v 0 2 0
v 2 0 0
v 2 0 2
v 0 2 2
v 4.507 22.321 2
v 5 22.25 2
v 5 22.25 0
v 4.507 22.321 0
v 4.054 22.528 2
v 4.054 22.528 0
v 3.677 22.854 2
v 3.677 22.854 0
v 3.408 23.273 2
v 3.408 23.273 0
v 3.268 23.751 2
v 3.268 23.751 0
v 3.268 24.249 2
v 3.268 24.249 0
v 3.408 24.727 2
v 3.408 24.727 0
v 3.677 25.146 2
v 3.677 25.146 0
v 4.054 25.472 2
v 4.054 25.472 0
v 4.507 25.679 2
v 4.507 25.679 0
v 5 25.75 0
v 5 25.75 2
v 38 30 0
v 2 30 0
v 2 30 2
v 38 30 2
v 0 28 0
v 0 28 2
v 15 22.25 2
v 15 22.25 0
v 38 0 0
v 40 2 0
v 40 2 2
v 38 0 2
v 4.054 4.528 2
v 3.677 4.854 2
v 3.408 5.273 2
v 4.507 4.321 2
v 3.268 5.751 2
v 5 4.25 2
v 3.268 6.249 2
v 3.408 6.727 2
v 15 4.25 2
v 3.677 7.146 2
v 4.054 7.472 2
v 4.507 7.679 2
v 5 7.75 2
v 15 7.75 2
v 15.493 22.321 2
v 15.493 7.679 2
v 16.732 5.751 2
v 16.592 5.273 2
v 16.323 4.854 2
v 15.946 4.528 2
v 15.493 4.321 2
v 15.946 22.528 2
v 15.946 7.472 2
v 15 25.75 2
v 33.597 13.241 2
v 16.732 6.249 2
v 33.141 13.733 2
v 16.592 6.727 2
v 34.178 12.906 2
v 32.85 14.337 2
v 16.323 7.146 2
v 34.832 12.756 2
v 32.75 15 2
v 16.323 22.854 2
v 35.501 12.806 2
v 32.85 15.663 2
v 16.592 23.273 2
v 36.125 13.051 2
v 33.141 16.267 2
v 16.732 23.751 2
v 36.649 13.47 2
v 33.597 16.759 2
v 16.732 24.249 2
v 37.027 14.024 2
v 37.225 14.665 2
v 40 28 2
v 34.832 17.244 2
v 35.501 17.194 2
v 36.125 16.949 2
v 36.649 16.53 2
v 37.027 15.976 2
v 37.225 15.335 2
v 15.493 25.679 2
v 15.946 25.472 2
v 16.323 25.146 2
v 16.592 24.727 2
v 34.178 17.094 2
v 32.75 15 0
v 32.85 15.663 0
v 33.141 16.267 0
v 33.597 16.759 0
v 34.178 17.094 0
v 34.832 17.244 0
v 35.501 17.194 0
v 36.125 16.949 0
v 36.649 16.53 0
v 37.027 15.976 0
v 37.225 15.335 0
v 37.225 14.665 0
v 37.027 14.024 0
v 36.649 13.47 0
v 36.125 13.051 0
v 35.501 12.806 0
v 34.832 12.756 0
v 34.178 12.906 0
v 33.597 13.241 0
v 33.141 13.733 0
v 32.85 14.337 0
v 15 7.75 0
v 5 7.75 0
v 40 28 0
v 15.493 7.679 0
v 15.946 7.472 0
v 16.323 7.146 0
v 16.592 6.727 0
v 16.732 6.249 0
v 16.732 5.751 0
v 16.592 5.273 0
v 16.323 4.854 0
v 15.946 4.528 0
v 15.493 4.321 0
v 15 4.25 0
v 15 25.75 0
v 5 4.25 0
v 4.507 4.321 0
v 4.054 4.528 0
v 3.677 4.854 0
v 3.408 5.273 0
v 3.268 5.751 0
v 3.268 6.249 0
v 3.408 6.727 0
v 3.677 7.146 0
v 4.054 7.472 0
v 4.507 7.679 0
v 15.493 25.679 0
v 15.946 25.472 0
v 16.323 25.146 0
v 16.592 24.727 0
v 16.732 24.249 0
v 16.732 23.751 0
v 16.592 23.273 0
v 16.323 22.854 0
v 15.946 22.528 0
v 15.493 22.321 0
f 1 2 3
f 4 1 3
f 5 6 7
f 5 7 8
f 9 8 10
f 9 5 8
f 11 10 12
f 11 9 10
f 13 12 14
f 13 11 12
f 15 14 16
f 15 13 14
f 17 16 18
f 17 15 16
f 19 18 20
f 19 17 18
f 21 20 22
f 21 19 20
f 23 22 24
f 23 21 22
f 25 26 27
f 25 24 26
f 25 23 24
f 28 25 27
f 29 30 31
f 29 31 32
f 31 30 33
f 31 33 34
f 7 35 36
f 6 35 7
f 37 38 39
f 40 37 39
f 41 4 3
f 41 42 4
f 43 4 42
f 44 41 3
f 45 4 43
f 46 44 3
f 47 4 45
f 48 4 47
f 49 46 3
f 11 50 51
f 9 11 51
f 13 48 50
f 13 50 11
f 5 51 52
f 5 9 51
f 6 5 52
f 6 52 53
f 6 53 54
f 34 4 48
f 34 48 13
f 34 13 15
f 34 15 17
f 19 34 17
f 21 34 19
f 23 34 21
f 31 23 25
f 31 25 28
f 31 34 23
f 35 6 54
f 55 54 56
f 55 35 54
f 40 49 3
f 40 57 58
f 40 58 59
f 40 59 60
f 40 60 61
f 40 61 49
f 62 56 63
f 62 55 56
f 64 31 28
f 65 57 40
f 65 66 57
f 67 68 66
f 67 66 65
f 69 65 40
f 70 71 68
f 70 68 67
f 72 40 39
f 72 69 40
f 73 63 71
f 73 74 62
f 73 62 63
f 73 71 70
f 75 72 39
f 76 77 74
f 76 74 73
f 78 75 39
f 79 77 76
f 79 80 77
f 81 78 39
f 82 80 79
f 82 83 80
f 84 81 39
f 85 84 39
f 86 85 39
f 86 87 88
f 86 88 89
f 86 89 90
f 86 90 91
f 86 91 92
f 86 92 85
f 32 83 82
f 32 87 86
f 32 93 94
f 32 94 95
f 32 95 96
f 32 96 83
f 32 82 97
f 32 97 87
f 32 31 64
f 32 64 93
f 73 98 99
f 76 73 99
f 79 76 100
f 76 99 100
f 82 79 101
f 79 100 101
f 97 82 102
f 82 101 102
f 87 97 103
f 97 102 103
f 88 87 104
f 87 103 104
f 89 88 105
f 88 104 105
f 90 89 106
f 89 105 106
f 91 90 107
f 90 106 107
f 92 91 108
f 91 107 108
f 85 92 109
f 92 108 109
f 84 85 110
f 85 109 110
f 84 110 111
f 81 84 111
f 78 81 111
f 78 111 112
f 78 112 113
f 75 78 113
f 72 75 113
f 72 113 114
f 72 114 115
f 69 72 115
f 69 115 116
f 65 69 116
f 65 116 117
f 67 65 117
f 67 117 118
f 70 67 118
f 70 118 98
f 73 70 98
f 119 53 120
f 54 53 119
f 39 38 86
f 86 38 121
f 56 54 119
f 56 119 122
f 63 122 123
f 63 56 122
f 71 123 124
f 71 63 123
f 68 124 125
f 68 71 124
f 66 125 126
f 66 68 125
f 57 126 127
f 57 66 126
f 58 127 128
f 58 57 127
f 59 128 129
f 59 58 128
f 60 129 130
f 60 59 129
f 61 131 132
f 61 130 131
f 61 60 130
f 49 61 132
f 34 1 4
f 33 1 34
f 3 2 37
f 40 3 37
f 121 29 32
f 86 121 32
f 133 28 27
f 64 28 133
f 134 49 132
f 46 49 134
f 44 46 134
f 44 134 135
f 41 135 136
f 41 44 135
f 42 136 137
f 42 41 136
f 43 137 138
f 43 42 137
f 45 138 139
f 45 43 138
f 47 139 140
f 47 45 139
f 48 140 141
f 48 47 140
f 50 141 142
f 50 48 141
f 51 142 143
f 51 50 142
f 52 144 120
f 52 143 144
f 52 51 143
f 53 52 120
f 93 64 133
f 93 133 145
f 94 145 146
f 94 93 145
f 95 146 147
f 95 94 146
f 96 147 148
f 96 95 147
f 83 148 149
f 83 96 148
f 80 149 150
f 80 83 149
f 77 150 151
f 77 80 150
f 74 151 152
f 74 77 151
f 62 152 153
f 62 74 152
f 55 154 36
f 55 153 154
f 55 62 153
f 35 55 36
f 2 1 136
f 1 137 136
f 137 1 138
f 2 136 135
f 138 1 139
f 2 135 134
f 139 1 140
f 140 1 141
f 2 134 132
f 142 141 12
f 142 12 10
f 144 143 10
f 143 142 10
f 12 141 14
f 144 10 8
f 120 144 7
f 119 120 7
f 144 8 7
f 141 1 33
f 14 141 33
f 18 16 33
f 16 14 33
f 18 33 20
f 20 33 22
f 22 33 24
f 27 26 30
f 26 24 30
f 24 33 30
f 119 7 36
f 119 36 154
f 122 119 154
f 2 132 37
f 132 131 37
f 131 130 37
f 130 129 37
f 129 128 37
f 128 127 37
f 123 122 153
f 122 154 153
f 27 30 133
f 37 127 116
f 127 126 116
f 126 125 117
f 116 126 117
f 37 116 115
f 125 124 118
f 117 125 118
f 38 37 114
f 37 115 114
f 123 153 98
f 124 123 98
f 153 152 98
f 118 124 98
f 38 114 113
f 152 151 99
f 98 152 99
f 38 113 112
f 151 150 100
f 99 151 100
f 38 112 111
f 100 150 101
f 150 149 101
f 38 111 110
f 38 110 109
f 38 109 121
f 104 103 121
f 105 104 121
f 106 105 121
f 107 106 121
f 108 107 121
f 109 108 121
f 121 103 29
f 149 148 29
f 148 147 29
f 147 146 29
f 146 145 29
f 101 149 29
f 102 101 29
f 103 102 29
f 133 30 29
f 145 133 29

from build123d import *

# Parameters (mm, degrees)
SKETCH1_W            = 40
SKETCH1_H            = 30
BOSS_EXTRUDE1_DEPTH  = 2
CHAMFER1_SIZE        = 2
N_CUT_EXTRUDE1_DEPTH = 51.039984013
N_CUT_EXTRUDE2_DEPTH = 51.039984013
D_DIAMETER_HOLE1_D   = 4.5


with BuildPart() as part:
    # Sketch1 → Boss-Extrude1 (new body)
    with BuildSketch(Plane.XY):
        with Locations((20, 15)):
            Rectangle(SKETCH1_W, SKETCH1_H)
    extrude(amount=BOSS_EXTRUDE1_DEPTH)

    # Chamfer1
    chamfer1_edges = [part.edges().sort_by_distance(p)[0] for p in [
        (0, 30, 1),
        (40, 30, 1),
        (40, 0, 1),
        (0, 0, 1),
    ]]
    chamfer(chamfer1_edges, length=CHAMFER1_SIZE)

    # Sketch2 → N Cut-Extrude1 (cut, through all)
    with BuildSketch(Plane.XY.offset(2)):
        with BuildLine():
            Line((5, 7.75), (15, 7.75))
            ThreePointArc((15, 7.75), (16.75, 6), (15, 4.25))
            Line((15, 4.25), (5, 4.25))
            ThreePointArc((5, 4.25), (3.25, 6), (5, 7.75))
        make_face()
    extrude(amount=-N_CUT_EXTRUDE1_DEPTH, mode=Mode.SUBTRACT)

    # Sketch3 → N Cut-Extrude2 (cut, through all)
    with BuildSketch(Plane.XY.offset(2)):
        with BuildLine():
            Line((5, 25.75), (15, 25.75))
            ThreePointArc((15, 25.75), (16.75, 24), (15, 22.25))
            Line((15, 22.25), (5, 22.25))
            ThreePointArc((5, 22.25), (3.25, 24), (5, 25.75))
        make_face()
    extrude(amount=-N_CUT_EXTRUDE2_DEPTH, mode=Mode.SUBTRACT)

    # D Diameter Hole1 (through all)
    with Locations(Plane.XY.offset(2)):
        with Locations((35, 15)):
            Hole(D_DIAMETER_HOLE1_D / 2)


solid = part.part
